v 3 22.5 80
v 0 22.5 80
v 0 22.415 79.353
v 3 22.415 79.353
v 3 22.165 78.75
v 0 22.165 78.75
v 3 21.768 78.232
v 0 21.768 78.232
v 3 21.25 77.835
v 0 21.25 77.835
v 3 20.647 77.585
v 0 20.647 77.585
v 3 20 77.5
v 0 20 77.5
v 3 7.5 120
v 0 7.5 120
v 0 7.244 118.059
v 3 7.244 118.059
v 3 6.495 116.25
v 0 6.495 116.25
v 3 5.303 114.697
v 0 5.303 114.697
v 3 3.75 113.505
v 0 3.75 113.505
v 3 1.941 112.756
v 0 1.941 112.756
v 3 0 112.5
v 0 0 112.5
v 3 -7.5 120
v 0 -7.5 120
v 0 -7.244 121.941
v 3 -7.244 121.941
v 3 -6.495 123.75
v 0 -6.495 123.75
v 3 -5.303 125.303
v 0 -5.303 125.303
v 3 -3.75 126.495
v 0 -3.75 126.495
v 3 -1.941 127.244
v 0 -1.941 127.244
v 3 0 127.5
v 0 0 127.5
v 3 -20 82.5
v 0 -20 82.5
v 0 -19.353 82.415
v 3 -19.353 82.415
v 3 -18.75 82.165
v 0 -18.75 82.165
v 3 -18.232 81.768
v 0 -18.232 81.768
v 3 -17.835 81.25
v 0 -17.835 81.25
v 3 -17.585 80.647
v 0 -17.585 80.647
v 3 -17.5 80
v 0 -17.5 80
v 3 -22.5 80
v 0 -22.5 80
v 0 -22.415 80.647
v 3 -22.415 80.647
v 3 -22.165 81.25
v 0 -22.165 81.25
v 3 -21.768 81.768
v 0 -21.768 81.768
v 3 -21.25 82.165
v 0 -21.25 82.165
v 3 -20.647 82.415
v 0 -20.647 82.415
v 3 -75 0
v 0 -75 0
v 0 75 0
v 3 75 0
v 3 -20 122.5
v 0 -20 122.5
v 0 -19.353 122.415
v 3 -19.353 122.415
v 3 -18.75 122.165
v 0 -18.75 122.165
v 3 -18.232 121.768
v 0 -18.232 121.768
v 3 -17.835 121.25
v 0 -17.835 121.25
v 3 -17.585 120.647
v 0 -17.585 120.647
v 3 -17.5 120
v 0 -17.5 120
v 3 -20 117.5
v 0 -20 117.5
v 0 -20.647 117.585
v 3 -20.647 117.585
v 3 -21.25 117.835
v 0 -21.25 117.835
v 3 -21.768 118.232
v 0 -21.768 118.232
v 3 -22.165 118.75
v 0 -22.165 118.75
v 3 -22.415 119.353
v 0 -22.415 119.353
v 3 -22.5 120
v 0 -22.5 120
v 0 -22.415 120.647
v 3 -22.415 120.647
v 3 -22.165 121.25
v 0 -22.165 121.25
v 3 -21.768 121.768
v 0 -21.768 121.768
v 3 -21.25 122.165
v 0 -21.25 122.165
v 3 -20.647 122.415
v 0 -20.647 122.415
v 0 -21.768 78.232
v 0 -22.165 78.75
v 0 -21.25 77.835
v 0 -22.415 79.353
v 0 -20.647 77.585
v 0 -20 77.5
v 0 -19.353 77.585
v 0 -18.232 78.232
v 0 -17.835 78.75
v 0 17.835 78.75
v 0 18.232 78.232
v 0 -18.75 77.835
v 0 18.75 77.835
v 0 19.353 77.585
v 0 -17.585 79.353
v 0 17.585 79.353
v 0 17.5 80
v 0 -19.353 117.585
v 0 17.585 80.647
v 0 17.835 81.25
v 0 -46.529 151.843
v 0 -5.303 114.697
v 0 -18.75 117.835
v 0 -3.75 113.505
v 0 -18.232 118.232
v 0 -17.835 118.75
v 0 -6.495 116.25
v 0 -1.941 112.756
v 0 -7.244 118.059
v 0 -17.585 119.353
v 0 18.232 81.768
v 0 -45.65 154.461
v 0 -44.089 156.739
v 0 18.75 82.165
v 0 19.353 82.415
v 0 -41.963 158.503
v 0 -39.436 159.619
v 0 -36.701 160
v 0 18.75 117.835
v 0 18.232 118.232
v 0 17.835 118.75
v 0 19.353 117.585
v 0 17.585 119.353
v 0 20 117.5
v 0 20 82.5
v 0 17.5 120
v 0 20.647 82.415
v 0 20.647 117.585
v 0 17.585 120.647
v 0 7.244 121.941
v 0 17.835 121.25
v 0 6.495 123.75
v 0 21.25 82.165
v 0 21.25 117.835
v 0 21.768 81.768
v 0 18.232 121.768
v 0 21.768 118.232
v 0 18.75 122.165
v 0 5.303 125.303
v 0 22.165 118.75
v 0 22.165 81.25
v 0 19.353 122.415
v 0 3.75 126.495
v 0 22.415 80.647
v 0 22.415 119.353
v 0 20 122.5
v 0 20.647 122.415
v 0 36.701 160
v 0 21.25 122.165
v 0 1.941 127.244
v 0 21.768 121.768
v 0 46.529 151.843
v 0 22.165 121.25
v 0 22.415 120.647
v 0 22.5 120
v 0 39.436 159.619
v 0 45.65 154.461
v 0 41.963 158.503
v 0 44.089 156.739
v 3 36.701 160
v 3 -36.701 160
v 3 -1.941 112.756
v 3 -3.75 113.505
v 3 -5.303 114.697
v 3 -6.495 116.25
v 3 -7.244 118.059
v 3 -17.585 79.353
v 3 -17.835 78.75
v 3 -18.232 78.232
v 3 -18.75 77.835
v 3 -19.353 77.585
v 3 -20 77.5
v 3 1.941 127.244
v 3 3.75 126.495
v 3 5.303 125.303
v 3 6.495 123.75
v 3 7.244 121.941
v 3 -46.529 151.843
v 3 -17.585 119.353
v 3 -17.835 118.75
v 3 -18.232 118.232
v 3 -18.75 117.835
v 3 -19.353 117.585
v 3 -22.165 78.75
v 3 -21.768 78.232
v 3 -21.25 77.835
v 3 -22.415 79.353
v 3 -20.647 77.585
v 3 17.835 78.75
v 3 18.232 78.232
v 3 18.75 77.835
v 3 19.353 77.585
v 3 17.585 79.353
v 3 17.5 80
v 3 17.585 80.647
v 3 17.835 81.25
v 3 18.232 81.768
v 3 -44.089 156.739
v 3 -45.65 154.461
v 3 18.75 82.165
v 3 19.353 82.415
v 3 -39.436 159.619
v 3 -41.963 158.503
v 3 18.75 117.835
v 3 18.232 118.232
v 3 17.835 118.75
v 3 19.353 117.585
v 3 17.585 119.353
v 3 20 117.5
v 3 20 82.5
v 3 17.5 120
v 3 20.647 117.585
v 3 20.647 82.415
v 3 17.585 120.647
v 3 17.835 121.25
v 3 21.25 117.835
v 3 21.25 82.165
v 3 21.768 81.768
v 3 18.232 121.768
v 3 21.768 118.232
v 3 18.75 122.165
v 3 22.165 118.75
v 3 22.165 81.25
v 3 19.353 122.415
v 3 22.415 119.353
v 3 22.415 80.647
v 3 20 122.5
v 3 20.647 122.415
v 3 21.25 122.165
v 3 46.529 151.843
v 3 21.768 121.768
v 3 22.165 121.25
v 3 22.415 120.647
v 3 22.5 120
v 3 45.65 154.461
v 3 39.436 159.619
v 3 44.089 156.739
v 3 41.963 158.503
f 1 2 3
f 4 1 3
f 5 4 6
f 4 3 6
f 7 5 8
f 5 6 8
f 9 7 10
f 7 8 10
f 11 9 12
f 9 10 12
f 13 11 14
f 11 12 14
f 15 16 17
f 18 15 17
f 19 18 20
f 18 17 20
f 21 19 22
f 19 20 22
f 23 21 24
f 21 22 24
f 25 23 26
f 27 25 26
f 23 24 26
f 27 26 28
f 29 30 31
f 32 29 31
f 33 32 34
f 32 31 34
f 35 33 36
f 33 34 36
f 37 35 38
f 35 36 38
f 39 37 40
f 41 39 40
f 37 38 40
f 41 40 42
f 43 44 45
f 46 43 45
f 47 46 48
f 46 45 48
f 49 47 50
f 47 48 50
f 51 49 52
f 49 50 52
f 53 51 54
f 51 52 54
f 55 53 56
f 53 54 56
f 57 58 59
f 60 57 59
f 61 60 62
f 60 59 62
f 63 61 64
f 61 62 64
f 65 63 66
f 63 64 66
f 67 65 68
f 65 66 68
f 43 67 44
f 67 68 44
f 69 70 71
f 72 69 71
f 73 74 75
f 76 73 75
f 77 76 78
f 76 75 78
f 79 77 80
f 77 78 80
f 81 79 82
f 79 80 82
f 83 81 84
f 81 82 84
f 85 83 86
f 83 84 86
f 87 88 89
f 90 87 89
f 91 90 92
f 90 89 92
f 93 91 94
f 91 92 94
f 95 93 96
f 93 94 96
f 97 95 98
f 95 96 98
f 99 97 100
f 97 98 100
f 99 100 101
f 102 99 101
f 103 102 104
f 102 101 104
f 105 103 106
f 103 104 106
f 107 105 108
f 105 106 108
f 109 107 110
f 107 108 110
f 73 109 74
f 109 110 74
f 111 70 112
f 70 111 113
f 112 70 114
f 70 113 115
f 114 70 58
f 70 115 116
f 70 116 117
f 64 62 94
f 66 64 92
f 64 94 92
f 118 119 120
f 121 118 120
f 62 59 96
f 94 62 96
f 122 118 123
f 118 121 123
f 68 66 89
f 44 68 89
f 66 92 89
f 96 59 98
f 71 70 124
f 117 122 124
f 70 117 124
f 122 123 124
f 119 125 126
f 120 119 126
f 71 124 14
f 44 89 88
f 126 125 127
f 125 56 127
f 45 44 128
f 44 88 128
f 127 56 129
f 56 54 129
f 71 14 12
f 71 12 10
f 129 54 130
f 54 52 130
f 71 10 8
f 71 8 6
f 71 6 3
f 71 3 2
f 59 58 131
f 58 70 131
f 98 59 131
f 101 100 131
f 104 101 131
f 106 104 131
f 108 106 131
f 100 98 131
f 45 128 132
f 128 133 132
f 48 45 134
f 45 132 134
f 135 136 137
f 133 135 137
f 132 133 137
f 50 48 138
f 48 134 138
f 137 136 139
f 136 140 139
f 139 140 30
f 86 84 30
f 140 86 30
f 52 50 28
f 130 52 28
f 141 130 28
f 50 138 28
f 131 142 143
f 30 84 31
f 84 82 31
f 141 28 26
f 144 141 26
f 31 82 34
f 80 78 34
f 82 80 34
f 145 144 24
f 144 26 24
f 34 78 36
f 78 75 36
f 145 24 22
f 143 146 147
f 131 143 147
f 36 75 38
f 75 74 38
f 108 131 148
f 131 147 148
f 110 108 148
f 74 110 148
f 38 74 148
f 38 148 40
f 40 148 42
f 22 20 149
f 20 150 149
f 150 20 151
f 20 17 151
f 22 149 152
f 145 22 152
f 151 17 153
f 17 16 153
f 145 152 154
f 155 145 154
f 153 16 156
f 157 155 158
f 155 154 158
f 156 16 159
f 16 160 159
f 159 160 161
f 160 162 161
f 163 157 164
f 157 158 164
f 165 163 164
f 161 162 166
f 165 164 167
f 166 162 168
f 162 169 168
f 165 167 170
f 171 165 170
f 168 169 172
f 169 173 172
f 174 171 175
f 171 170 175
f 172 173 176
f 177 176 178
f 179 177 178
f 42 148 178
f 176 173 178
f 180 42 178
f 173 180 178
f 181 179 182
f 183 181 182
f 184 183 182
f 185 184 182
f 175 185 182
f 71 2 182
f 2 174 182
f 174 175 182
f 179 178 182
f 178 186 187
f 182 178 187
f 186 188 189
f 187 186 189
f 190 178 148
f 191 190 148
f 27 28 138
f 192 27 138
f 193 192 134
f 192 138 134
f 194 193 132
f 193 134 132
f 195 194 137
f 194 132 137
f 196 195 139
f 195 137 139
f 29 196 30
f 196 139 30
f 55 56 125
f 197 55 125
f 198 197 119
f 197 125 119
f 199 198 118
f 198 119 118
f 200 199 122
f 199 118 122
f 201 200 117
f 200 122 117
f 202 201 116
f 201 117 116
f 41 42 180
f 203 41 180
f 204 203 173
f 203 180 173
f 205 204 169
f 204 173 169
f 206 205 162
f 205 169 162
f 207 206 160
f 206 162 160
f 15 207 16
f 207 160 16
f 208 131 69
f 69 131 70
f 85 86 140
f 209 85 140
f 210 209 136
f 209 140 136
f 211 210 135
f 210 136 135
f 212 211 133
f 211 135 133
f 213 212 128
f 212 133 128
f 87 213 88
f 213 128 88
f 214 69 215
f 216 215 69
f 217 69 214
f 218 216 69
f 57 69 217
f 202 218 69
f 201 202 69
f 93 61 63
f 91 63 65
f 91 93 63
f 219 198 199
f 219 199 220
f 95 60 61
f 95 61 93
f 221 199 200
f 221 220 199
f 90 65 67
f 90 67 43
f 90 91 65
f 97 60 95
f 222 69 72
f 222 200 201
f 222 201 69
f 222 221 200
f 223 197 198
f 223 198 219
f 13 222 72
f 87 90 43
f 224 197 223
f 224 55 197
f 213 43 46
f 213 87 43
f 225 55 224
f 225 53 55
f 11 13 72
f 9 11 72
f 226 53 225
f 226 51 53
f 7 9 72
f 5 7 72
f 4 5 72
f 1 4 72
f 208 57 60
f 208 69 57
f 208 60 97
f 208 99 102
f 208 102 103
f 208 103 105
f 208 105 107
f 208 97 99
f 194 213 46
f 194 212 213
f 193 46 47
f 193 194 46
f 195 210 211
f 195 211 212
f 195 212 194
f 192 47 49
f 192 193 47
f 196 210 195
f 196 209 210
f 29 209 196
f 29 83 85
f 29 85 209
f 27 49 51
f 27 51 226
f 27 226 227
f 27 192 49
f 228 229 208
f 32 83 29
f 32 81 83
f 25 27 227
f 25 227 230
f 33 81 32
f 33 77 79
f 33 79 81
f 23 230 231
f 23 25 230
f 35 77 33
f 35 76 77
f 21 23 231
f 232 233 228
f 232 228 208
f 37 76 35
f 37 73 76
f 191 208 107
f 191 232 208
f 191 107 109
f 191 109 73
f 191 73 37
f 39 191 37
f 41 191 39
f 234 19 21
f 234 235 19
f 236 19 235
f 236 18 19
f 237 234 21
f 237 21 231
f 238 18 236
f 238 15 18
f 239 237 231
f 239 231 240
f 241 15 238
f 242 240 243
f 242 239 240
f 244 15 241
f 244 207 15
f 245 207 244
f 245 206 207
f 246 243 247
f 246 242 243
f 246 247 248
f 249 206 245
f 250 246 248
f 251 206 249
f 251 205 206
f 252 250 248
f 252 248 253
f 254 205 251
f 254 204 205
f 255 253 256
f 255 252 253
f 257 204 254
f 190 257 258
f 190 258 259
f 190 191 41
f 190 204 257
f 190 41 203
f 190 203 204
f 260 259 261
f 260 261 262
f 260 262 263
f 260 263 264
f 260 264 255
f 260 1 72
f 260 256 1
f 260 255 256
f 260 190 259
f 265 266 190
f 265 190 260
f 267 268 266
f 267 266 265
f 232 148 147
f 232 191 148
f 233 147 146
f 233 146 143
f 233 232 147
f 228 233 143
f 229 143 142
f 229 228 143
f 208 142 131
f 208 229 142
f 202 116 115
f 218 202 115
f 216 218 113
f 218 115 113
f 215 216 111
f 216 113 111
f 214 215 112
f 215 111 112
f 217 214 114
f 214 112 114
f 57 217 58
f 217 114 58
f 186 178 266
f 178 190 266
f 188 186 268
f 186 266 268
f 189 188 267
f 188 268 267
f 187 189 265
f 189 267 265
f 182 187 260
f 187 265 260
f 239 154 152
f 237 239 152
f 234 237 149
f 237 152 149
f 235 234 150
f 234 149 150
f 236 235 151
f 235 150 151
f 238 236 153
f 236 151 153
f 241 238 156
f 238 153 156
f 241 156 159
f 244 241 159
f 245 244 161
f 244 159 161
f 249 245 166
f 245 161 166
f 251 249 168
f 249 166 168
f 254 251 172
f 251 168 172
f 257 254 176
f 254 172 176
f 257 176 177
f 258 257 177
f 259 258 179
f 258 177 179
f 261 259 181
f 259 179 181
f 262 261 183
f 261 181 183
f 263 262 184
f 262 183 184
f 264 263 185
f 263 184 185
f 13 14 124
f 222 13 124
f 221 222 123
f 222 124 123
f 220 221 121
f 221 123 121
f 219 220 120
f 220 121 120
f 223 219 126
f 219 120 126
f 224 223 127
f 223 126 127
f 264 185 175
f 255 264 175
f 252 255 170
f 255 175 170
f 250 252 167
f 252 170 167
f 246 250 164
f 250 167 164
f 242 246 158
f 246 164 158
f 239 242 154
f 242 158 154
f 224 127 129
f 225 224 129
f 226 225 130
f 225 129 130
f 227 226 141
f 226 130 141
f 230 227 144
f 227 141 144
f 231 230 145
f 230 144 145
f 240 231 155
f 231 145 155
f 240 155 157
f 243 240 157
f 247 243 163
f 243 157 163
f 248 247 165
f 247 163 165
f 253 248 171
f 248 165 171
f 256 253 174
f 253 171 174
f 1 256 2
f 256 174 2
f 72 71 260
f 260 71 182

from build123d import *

# Parameters (mm, degrees)
F1_DEPTH = 3
F2_R     = 10


with BuildPart() as f1:
    # F0 (on Right) → F1 (new body)
    with BuildSketch(Plane.YZ):
        Polygon((45, 160), (0, 160), (-45, 160), (-75, 0), (0, 0), (75, 0), align=None)
        with BuildLine():
            ThreePointArc((-20, 82.5), (-18.232233, 81.767767), (-17.5, 80))
            ThreePointArc((-17.5, 80), (-18.232233, 78.232233), (-20, 77.5))
            ThreePointArc((-20, 77.5), (-21.767767, 78.232233), (-22.5, 80))
            ThreePointArc((-22.5, 80), (-21.767767, 81.767767), (-20, 82.5))
        make_face(mode=Mode.SUBTRACT)
        with BuildLine():
            ThreePointArc((-20, 122.5), (-18.232233, 121.767767), (-17.5, 120))
            ThreePointArc((-17.5, 120), (-18.232233, 118.232233), (-20, 117.5))
            ThreePointArc((-20, 117.5), (-21.767767, 118.232233), (-22.5, 120))
            ThreePointArc((-22.5, 120), (-21.767767, 121.767767), (-20, 122.5))
        make_face(mode=Mode.SUBTRACT)
        with BuildLine():
            ThreePointArc((22.5, 80), (21.767767, 78.232233), (20, 77.5))
            ThreePointArc((20, 77.5), (18.232233, 78.232233), (17.5, 80))
            ThreePointArc((17.5, 80), (18.232233, 81.767767), (20, 82.5))
            ThreePointArc((20, 82.5), (21.767767, 81.767767), (22.5, 80))
        make_face(mode=Mode.SUBTRACT)
        with BuildLine():
            ThreePointArc((0, 127.5), (5.303301, 125.303301), (7.5, 120))
            ThreePointArc((7.5, 120), (5.303301, 114.696699), (0, 112.5))
            ThreePointArc((0, 112.5), (-5.303301, 114.696699), (-7.5, 120))
            ThreePointArc((-7.5, 120), (-5.303301, 125.303301), (0, 127.5))
        make_face(mode=Mode.SUBTRACT)
        with BuildLine():
            ThreePointArc((20, 122.5), (21.767767, 121.767767), (22.5, 120))
            ThreePointArc((22.5, 120), (21.767767, 118.232233), (20, 117.5))
            ThreePointArc((20, 117.5), (18.232233, 118.232233), (17.5, 120))
            ThreePointArc((17.5, 120), (18.232233, 121.767767), (20, 122.5))
        make_face(mode=Mode.SUBTRACT)
    extrude(amount=F1_DEPTH)

    # F2
    f2_edges = [f1.edges().sort_by_distance(p)[0] for p in [
        (1.5, -45, 160),
        (1.5, 45, 160),
    ]]
    fillet(f2_edges, radius=F2_R)


solid = f1.part
